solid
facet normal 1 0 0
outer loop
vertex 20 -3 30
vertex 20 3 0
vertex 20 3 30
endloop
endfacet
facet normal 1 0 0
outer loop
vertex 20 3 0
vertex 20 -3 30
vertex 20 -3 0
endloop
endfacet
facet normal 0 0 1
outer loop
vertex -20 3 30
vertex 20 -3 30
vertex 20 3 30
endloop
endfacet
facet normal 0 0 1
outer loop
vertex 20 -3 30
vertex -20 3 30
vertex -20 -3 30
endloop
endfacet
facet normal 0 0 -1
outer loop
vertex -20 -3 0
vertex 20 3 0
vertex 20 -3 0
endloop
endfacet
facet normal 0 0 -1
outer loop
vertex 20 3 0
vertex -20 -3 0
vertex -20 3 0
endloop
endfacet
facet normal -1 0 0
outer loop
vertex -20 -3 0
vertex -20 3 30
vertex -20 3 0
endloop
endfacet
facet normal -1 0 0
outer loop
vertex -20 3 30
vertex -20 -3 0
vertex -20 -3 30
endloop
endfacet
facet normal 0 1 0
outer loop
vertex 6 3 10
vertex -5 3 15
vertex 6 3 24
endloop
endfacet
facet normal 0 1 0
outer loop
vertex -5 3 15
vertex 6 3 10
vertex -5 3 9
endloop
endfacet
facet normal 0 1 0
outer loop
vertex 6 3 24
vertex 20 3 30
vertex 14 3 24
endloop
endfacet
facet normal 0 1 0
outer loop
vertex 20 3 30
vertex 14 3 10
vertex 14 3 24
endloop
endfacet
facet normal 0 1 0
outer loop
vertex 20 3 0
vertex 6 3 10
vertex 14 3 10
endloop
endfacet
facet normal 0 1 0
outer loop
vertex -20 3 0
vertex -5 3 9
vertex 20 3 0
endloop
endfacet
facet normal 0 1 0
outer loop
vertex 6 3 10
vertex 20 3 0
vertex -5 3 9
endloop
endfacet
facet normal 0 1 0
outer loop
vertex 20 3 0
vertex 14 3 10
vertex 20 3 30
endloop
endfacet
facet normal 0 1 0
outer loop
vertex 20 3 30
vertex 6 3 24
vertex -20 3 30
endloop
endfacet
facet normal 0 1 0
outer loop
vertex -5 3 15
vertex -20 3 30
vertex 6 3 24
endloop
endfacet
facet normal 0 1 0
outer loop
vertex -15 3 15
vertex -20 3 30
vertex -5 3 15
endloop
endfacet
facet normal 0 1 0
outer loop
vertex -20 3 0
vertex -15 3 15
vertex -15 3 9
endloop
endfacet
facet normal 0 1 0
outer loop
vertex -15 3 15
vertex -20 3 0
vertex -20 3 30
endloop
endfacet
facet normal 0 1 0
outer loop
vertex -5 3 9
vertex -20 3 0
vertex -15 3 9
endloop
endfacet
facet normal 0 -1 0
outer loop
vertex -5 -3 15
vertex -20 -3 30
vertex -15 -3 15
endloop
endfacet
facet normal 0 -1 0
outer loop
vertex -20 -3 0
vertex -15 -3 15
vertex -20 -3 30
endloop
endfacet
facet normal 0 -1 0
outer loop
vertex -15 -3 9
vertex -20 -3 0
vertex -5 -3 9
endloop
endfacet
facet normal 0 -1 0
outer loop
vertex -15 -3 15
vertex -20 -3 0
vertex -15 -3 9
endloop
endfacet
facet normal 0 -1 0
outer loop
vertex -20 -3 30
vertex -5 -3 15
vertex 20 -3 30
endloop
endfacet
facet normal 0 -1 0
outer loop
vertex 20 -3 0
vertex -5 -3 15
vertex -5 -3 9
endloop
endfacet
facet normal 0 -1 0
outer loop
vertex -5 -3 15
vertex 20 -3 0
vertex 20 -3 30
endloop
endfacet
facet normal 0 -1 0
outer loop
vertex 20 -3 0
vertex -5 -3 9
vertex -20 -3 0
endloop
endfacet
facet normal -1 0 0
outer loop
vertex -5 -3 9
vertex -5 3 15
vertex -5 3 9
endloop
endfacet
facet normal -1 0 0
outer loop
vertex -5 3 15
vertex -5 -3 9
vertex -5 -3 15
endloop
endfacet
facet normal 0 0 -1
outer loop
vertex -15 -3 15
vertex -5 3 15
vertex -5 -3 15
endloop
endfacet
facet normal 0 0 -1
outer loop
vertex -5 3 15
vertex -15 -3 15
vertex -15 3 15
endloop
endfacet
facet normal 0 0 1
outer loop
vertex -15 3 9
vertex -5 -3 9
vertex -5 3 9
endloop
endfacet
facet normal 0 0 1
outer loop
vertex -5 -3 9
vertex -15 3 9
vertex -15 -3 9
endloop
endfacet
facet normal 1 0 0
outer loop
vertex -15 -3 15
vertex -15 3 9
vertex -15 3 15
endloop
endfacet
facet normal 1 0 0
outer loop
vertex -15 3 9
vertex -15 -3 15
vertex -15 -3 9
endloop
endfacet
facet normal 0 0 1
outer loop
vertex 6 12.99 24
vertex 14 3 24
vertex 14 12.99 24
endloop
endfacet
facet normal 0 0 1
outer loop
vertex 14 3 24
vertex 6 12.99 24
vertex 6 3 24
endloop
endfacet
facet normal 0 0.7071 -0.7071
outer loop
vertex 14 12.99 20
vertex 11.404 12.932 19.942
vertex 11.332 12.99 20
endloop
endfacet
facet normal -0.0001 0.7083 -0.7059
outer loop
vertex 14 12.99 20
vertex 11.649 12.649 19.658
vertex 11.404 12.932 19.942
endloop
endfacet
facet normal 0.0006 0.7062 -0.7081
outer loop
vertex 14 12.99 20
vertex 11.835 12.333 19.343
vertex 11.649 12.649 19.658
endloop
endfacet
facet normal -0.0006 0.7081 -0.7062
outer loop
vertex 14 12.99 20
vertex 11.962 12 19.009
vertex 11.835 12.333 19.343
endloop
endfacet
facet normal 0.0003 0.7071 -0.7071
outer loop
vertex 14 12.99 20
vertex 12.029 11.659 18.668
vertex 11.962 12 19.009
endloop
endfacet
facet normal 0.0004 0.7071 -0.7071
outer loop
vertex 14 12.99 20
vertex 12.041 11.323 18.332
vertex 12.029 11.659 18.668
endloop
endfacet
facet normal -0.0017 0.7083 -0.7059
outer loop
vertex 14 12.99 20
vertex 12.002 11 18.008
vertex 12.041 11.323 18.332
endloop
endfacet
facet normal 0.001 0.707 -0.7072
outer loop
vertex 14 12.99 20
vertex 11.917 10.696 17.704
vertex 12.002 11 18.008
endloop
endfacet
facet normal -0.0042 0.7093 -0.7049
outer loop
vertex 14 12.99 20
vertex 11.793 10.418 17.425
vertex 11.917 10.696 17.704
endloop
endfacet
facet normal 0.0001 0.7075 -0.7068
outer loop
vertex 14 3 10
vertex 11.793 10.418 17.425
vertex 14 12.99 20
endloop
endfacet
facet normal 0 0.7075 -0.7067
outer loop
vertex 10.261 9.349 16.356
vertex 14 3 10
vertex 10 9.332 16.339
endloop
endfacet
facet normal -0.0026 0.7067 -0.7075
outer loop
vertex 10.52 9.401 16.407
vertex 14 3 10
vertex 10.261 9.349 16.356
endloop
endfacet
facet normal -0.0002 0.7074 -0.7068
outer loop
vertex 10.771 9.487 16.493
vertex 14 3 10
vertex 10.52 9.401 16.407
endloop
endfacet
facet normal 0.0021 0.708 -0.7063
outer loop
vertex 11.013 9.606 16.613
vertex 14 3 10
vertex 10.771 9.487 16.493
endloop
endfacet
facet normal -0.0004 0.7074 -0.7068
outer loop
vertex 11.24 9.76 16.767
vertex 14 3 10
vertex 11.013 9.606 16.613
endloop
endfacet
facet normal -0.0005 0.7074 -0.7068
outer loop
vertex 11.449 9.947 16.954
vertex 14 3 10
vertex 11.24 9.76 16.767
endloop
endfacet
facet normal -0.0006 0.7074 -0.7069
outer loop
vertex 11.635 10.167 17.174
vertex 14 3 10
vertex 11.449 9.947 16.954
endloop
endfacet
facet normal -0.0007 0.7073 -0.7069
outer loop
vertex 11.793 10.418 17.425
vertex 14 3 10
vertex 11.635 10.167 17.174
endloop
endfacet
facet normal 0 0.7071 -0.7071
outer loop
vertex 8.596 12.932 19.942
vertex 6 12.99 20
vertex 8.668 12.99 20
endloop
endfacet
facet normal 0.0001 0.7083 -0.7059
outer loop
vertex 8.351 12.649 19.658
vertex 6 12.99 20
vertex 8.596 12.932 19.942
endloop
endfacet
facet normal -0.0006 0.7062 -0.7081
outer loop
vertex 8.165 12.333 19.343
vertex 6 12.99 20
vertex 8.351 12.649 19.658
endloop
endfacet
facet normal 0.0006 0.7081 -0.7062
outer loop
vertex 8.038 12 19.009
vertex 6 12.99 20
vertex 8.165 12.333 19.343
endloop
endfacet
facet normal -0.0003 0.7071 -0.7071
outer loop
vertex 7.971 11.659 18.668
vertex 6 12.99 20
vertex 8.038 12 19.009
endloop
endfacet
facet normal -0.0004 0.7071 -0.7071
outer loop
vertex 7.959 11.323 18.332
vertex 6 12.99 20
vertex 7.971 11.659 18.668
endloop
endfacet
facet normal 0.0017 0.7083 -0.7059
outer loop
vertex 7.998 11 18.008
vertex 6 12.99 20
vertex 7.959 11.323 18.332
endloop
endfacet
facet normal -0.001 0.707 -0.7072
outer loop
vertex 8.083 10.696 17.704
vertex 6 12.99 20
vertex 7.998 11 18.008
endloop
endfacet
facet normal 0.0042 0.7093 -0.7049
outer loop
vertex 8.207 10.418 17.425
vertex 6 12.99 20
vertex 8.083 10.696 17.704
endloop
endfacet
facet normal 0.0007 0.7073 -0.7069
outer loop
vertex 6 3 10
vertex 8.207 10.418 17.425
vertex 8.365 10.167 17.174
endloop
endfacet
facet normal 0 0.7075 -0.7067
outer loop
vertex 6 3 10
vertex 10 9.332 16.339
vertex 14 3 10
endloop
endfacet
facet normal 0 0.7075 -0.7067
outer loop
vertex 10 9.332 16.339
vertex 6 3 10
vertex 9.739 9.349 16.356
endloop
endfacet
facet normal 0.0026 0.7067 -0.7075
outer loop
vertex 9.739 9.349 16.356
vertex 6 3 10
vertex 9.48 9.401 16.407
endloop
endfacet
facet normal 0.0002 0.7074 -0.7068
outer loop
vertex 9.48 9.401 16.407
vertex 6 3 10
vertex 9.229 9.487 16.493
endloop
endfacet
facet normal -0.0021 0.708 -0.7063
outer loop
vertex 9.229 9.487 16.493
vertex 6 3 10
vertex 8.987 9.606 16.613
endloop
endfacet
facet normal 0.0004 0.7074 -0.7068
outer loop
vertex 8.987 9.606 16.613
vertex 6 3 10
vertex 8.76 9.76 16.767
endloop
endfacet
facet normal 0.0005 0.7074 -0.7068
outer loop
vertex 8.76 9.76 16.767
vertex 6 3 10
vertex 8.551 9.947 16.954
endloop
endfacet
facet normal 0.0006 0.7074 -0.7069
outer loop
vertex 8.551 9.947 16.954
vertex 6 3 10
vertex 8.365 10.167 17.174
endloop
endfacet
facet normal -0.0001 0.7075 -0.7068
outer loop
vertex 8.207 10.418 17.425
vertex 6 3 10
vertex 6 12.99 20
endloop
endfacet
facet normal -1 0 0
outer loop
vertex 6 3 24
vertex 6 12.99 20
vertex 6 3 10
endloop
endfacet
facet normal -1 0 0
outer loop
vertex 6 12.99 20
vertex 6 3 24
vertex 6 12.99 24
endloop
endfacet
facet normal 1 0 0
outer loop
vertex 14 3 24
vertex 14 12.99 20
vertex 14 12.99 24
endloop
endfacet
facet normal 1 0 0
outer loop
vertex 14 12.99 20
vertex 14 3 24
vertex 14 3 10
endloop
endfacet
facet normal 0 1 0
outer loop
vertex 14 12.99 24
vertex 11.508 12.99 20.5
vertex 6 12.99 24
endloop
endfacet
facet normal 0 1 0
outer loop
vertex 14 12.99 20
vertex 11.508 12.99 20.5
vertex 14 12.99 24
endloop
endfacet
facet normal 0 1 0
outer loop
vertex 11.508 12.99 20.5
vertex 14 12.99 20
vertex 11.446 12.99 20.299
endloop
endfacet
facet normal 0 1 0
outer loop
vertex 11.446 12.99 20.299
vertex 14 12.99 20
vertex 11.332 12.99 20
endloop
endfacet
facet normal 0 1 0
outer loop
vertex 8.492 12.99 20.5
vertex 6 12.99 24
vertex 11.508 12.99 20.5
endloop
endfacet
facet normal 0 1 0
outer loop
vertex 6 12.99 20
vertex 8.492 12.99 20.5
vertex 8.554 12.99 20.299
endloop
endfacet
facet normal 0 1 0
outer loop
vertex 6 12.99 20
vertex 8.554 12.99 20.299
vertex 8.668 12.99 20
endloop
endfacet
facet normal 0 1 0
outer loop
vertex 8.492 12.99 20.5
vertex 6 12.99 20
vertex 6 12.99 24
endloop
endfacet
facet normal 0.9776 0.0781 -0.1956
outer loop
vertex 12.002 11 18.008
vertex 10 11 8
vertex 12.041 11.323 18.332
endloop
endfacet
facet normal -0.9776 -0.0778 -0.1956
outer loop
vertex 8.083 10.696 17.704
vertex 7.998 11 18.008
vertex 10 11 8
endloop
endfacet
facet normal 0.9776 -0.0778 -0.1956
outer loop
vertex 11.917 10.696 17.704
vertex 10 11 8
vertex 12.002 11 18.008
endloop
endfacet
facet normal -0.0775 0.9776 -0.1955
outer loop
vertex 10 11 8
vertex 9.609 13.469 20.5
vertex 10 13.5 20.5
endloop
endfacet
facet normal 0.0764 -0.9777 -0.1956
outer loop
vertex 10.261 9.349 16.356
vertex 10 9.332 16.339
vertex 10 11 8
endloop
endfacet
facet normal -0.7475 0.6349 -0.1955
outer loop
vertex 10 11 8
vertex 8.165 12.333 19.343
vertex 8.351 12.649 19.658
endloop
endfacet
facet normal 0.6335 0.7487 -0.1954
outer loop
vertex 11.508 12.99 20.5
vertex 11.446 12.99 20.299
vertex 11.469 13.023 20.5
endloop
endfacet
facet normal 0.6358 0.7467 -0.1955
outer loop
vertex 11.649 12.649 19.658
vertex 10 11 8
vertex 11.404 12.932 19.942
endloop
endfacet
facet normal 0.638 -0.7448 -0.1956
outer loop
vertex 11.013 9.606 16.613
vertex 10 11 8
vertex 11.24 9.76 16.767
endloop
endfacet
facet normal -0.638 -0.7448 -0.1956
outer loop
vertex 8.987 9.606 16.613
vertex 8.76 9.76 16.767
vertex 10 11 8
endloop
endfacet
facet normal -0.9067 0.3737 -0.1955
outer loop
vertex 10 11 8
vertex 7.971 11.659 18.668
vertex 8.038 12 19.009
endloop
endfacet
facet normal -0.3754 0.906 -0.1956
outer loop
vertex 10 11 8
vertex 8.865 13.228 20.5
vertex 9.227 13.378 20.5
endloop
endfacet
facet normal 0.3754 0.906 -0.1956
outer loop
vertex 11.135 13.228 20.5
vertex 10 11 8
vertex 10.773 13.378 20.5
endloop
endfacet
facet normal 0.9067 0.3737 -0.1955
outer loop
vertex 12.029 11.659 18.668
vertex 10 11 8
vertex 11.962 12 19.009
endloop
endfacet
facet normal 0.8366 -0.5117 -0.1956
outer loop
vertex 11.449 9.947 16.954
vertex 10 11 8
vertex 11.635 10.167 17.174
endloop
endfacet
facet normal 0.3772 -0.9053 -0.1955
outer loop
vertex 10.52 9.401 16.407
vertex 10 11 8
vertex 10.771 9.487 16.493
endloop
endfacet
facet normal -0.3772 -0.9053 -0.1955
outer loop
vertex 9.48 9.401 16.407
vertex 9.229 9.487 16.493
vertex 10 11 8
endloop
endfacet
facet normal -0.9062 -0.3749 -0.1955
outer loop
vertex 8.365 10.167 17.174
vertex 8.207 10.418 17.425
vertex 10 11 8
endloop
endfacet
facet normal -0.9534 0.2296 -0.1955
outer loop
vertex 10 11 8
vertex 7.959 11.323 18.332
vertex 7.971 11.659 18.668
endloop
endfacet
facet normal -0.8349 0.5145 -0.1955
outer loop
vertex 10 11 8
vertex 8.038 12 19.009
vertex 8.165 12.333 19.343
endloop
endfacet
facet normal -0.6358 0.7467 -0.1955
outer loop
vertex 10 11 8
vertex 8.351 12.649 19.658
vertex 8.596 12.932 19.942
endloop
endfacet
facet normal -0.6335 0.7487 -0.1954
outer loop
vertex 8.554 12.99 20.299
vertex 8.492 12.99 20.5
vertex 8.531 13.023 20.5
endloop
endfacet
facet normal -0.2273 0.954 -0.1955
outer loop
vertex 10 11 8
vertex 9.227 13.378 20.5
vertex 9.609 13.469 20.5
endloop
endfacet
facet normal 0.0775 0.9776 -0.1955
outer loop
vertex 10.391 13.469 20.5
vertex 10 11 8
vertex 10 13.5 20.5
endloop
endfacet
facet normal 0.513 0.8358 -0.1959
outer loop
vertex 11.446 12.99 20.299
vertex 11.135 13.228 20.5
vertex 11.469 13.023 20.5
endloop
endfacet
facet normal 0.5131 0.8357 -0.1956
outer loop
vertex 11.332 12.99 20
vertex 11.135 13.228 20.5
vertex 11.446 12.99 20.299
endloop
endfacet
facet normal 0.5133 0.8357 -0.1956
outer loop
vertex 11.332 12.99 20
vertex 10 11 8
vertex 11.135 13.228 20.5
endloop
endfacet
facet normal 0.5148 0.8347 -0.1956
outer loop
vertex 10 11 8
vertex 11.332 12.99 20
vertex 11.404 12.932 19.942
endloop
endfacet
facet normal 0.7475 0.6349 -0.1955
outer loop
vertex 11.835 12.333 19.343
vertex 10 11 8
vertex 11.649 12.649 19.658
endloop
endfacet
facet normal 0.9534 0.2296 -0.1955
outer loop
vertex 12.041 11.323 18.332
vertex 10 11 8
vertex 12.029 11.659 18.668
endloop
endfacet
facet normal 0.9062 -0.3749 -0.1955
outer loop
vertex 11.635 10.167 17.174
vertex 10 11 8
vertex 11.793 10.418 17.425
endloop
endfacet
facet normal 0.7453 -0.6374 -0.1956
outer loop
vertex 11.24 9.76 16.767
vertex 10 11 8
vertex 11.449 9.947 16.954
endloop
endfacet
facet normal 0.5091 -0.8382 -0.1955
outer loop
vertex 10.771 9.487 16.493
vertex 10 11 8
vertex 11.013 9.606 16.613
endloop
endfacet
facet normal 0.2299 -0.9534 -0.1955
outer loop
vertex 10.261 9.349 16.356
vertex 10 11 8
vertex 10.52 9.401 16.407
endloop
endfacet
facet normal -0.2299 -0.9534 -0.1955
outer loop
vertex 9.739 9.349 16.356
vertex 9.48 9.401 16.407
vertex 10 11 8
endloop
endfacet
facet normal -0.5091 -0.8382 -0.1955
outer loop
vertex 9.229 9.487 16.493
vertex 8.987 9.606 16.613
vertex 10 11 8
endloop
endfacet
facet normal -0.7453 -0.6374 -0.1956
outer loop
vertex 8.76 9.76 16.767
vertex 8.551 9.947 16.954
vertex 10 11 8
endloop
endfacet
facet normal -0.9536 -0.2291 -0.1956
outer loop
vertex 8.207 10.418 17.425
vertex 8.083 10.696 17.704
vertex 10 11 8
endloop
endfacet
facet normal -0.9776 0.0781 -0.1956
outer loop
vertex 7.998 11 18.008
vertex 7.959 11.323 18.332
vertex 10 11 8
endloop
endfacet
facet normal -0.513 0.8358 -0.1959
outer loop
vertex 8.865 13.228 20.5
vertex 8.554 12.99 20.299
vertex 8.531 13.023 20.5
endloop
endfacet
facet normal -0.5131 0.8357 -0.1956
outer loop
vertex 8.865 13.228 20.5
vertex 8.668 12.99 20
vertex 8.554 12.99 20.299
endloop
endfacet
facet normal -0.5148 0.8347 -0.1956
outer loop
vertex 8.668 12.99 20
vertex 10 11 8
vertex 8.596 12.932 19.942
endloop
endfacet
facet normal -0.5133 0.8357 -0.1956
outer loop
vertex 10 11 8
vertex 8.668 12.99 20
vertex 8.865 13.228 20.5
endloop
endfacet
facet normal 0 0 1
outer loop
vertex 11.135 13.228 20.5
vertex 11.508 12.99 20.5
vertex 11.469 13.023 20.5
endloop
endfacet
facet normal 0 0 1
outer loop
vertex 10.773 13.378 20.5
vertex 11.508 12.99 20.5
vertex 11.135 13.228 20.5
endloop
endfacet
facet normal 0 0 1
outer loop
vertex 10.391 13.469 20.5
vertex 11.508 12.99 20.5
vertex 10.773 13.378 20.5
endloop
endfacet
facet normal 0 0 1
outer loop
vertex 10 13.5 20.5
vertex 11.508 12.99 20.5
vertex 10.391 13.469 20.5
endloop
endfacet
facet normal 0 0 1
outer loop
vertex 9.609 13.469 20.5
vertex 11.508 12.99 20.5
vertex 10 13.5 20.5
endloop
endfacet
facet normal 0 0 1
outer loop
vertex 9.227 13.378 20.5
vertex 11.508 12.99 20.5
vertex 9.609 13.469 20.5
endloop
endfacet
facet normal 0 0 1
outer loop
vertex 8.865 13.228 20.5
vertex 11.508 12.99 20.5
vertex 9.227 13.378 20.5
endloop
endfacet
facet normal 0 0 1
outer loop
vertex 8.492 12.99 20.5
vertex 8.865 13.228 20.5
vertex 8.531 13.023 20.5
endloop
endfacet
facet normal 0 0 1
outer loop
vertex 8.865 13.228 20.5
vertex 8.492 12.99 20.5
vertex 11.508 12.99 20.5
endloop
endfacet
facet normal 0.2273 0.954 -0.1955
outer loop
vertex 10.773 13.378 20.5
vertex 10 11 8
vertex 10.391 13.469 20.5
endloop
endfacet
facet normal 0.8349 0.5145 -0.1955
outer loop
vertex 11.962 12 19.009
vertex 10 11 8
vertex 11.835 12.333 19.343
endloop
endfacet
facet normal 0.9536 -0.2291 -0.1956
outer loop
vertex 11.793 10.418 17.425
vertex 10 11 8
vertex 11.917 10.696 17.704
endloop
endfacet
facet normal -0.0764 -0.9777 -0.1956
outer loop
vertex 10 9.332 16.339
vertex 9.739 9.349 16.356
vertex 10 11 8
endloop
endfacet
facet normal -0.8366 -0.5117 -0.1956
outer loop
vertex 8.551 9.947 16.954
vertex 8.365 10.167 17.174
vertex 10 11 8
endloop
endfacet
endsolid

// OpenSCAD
// =====================================================================
//  UniHolder — tests/test_checker_fail.scad                       ST-1
//  Deliberately UNPRINTABLE coupon. tools/check_overhang.py must FAIL on it:
//    A  rectangular hole with a flat ceiling          -> P2 (90° overhang)
//    B  arm with a 45° underside (fine) carrying a
//       downward-pointing cone (sides fine, apex floats) -> P3 only
// =====================================================================
$fa = 6; $fs = 0.4;

difference() {
    translate([-20, -3, 0]) cube([40, 6, 30]);
    translate([-10, 0, 12]) cube([10, 8, 6], center = true);        // A
}

// B: printable arm growing out of the +Y face with a 45° support slope
hull() {
    translate([6, 2.99, 20]) cube([8, 10, 4]);
    translate([6, 2.99, 10]) cube([8, 0.01, 14]);
}
// cone hanging below the arm tip: faces are ~11° from vertical, but the apex floats
translate([10, 11, 8]) cylinder(h = 12.5, r1 = 0, r2 = 2.5);
